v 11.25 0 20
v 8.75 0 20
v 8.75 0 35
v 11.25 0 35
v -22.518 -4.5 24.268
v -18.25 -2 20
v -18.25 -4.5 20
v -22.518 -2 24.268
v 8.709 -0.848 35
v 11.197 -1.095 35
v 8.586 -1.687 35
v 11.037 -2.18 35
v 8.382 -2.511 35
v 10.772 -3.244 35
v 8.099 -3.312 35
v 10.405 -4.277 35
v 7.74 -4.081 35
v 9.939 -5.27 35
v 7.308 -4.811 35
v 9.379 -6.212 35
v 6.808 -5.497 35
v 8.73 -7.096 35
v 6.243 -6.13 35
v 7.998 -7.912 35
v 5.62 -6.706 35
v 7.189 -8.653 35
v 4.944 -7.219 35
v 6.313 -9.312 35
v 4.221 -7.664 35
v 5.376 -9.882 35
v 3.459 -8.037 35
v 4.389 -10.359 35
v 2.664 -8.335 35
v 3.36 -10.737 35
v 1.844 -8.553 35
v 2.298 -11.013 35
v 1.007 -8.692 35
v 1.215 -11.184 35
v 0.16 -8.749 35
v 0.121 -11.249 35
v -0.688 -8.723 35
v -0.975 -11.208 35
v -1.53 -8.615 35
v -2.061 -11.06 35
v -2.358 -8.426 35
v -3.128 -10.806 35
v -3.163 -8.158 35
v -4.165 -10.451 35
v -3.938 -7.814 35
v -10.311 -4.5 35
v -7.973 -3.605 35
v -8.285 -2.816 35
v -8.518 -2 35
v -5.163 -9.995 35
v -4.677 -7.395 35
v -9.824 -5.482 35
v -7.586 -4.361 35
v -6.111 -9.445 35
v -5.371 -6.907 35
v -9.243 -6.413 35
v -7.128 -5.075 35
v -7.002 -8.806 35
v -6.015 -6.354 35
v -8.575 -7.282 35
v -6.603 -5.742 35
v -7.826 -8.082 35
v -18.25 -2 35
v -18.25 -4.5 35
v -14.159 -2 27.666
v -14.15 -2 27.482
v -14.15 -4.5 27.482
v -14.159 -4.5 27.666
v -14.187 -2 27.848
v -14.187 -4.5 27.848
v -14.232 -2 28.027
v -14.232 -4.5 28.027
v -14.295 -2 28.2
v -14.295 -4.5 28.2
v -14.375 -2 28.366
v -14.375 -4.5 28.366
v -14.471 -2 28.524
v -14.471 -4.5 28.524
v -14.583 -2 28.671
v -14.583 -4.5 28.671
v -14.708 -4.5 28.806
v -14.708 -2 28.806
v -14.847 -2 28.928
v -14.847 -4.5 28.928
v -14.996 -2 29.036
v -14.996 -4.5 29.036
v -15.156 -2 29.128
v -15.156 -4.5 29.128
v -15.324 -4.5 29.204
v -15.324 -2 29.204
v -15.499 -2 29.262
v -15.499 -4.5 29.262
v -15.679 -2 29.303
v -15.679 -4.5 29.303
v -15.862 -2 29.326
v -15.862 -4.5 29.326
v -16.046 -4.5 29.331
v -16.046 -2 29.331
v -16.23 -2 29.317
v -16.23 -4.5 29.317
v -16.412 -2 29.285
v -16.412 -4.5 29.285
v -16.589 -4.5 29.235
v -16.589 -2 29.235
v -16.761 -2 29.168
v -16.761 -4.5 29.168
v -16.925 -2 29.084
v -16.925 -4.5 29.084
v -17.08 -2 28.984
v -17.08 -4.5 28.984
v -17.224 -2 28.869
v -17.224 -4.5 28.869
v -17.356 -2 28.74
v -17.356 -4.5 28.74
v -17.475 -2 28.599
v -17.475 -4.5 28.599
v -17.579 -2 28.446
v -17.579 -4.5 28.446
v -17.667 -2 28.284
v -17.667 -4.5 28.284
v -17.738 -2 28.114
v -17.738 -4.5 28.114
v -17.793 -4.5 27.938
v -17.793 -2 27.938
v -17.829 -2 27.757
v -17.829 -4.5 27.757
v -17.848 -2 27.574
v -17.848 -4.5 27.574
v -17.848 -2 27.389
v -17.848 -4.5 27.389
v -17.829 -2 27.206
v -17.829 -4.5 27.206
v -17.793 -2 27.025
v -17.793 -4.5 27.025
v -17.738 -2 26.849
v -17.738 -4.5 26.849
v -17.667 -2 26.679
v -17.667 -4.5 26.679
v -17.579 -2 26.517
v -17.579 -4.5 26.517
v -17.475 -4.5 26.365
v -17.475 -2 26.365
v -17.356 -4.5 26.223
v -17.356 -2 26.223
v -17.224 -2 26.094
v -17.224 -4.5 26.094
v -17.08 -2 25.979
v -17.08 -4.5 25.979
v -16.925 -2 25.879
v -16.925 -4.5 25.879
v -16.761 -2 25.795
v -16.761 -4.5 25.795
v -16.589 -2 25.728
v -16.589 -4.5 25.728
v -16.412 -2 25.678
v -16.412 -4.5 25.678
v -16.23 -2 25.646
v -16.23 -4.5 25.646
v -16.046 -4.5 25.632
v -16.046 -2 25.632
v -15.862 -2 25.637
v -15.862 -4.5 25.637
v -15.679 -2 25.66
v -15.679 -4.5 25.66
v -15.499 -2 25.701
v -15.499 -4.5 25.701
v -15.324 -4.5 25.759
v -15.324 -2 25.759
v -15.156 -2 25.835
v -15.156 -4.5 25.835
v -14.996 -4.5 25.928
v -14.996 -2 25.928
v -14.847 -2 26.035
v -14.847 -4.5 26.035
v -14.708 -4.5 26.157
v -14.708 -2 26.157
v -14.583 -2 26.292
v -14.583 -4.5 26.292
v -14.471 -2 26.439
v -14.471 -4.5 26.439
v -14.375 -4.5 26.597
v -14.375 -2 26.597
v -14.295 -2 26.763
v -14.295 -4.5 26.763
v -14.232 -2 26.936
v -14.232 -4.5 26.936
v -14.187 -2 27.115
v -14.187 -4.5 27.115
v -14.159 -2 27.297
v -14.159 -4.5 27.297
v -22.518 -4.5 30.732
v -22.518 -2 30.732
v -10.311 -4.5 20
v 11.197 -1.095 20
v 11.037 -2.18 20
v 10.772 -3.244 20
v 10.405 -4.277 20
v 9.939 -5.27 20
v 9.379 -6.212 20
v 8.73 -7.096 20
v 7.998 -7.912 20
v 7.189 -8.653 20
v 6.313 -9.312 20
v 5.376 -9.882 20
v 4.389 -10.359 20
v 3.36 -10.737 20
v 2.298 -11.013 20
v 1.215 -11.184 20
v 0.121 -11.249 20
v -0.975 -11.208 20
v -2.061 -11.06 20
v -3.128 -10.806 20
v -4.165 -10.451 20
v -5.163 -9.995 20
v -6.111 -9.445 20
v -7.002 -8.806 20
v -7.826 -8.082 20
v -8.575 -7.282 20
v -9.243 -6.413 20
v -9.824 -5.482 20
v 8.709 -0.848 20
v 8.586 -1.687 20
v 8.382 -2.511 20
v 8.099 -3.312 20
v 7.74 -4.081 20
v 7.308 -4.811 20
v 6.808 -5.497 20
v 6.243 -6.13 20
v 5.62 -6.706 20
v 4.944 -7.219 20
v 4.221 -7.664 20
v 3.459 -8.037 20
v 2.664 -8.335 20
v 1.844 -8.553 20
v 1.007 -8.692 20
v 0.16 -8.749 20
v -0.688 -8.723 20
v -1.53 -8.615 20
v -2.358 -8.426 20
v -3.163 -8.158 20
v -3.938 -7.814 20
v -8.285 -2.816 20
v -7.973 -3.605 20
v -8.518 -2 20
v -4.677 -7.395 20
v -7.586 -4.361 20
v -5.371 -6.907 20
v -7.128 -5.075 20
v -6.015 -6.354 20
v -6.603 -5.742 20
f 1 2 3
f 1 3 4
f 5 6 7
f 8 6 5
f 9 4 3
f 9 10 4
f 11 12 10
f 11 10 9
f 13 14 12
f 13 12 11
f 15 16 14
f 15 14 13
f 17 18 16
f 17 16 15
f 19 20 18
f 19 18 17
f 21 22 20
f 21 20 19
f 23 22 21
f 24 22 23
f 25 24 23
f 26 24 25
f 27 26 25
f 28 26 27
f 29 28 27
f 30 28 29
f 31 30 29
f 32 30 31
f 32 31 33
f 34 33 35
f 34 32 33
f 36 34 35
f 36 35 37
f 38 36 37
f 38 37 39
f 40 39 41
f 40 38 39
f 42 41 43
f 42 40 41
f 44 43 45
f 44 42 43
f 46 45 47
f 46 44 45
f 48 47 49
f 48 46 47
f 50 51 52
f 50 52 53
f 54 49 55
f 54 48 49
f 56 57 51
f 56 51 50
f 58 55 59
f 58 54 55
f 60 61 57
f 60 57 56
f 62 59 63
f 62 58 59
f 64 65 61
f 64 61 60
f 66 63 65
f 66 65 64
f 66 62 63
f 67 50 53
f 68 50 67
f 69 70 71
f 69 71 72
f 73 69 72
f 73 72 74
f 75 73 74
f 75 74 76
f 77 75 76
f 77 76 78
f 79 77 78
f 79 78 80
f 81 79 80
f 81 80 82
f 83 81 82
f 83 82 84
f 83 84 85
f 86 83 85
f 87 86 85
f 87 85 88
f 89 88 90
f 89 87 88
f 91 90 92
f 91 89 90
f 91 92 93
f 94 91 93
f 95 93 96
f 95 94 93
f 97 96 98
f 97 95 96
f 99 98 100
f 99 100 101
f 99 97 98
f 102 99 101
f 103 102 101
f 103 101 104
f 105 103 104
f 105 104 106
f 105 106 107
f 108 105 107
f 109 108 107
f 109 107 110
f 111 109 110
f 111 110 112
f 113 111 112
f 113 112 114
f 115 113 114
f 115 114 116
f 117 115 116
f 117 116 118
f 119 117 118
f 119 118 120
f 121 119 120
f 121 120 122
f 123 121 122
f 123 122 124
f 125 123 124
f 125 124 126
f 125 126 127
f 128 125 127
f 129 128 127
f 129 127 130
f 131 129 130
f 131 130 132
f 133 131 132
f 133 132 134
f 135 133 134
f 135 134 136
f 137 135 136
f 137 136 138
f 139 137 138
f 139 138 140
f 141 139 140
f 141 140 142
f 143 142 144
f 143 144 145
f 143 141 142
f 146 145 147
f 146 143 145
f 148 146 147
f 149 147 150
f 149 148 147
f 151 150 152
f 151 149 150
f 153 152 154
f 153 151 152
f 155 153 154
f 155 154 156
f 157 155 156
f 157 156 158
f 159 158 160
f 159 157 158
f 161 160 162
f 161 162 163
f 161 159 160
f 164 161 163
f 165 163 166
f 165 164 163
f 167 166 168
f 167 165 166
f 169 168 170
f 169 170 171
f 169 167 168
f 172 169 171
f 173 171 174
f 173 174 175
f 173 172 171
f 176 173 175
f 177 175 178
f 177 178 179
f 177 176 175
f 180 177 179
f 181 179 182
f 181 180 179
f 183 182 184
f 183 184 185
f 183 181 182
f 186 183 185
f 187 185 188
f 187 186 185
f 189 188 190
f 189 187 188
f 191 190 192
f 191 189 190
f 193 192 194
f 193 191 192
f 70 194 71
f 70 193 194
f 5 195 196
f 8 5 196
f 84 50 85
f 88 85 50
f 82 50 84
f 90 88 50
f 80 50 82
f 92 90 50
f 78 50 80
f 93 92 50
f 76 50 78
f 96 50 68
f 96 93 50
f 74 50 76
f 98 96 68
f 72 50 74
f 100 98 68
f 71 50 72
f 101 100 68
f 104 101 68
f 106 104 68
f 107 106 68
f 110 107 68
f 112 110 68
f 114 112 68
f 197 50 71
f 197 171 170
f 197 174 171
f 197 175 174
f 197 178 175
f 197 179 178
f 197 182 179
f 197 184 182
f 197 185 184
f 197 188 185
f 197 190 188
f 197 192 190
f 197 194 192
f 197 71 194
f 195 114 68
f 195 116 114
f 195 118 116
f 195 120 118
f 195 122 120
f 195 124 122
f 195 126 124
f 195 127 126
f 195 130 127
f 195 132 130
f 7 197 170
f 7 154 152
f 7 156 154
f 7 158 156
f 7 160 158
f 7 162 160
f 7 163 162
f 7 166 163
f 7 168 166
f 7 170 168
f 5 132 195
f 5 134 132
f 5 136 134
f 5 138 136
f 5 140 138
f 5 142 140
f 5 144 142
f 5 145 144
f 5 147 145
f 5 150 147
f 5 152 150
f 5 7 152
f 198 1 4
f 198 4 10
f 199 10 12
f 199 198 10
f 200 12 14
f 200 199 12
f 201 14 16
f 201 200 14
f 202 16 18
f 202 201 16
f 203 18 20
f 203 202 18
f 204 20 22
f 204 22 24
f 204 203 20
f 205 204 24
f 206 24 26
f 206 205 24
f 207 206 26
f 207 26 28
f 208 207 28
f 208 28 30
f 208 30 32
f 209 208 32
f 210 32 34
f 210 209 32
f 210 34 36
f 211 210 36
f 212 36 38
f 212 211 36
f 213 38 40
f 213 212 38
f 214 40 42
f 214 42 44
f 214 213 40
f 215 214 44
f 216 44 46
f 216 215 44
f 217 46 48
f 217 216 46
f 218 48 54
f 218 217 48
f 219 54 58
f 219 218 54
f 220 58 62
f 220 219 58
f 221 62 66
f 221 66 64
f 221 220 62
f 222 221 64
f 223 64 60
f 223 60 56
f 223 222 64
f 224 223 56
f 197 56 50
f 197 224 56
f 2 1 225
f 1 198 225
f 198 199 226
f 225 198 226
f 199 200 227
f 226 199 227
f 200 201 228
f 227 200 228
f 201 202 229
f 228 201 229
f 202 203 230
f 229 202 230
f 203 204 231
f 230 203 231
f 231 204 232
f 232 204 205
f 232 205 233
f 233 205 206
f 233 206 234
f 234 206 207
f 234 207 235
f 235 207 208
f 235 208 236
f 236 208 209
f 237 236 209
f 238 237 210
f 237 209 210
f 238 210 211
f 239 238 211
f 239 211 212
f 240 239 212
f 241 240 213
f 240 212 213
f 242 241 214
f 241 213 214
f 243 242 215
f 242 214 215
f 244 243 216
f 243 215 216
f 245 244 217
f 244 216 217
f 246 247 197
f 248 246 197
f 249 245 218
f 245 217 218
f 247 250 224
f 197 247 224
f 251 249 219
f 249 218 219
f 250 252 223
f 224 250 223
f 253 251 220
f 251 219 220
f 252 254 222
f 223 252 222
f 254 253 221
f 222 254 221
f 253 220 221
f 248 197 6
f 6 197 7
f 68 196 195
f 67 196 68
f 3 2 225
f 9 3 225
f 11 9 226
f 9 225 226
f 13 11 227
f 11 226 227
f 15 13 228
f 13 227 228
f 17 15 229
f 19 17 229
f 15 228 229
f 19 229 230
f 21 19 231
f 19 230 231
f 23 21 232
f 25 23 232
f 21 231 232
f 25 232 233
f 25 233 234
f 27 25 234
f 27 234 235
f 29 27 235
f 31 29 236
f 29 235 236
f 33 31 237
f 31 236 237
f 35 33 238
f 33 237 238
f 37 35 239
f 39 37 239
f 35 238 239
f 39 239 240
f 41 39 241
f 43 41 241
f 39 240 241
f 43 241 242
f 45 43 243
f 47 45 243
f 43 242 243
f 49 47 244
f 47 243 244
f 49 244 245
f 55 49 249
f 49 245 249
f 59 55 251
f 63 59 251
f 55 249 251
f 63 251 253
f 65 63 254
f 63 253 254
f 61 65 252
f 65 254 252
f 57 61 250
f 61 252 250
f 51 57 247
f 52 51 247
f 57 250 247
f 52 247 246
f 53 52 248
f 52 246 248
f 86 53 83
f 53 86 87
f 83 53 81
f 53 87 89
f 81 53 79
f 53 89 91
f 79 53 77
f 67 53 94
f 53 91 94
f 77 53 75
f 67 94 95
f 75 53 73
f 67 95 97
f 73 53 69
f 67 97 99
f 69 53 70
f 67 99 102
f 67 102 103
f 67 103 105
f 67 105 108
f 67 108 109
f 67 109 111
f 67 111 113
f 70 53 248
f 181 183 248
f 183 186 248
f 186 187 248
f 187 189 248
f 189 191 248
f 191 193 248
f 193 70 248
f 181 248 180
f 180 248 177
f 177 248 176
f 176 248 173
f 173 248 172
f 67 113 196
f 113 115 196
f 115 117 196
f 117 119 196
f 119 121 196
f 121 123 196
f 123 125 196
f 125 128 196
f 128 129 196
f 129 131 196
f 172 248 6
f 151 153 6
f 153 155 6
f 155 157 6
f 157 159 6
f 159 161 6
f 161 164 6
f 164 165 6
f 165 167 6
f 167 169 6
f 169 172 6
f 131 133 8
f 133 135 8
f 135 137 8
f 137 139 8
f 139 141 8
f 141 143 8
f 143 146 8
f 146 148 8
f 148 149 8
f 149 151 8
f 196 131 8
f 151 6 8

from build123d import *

# Parameters (mm, degrees)
SKETCH016_R       = 1.85
EXTRUDE013_DEPTH  = 12
CYLINDER007_R     = 5
CYLINDER007_DEPTH = 1
EXTRUDE012_DEPTH  = 15


with BuildPart() as extrude013:
    # Sketch016 → Extrude013 (new body)
    with BuildSketch(Plane.XZ):
        Polygon((11.75, 36), (11.75, 19), (-17.25, 19), (-23.25, 25), (-23.25, 30), (-17.25, 36), align=None)
        with Locations((-16, 27.481564)):
            Circle(SKETCH016_R, mode=Mode.SUBTRACT)
    extrude(amount=-EXTRUDE013_DEPTH)


with BuildPart() as unprintable:
    # Cylinder007 → Cylinder007 (new body)
    with BuildSketch(Plane(origin=(-16, 18, 27.5), x_dir=(1, 0, 0), z_dir=(0, -1, 0))):
        Circle(CYLINDER007_R)
    extrude(amount=CYLINDER007_DEPTH)


with BuildPart() as body007:
    # Sketch015 → Extrude012 (new body)
    with BuildSketch(Plane.XY.offset(50)):
        with BuildLine():
            ThreePointArc((8.75, 0), (1.006685, 8.691898), (-8.518363, 2))
            Line((-8.518363, 2), (-22.518363, 2))
            Line((-22.518363, 4.5), (-22.518363, 2))
            Line((-10.310795, 4.5), (-22.518363, 4.5))
            ThreePointArc((11.25, 0), (2.298483, 11.012696), (-10.310795, 4.5))
            Line((8.75, 0), (11.25, 0))
        make_face()
    extrude(amount=EXTRUDE012_DEPTH)


with BuildPart() as body007_1:
    # Extrude012 placement: moved
    add(body007.part.moved(Location((0, 0, -30))))

    # Fusion016: union unprintable
    add(unprintable.part)

    # Common001: intersect Extrude013
    add(extrude013.part, mode=Mode.INTERSECT)


with BuildPart() as part_mirroring008:
    # Part__Mirroring008: instance of Body007
    add(body007_1.part.mirror(Plane(origin=(0, 0, 0), x_dir=(1, 0, 0), z_dir=(0, 1, 0))))


solid = part_mirroring008.part
